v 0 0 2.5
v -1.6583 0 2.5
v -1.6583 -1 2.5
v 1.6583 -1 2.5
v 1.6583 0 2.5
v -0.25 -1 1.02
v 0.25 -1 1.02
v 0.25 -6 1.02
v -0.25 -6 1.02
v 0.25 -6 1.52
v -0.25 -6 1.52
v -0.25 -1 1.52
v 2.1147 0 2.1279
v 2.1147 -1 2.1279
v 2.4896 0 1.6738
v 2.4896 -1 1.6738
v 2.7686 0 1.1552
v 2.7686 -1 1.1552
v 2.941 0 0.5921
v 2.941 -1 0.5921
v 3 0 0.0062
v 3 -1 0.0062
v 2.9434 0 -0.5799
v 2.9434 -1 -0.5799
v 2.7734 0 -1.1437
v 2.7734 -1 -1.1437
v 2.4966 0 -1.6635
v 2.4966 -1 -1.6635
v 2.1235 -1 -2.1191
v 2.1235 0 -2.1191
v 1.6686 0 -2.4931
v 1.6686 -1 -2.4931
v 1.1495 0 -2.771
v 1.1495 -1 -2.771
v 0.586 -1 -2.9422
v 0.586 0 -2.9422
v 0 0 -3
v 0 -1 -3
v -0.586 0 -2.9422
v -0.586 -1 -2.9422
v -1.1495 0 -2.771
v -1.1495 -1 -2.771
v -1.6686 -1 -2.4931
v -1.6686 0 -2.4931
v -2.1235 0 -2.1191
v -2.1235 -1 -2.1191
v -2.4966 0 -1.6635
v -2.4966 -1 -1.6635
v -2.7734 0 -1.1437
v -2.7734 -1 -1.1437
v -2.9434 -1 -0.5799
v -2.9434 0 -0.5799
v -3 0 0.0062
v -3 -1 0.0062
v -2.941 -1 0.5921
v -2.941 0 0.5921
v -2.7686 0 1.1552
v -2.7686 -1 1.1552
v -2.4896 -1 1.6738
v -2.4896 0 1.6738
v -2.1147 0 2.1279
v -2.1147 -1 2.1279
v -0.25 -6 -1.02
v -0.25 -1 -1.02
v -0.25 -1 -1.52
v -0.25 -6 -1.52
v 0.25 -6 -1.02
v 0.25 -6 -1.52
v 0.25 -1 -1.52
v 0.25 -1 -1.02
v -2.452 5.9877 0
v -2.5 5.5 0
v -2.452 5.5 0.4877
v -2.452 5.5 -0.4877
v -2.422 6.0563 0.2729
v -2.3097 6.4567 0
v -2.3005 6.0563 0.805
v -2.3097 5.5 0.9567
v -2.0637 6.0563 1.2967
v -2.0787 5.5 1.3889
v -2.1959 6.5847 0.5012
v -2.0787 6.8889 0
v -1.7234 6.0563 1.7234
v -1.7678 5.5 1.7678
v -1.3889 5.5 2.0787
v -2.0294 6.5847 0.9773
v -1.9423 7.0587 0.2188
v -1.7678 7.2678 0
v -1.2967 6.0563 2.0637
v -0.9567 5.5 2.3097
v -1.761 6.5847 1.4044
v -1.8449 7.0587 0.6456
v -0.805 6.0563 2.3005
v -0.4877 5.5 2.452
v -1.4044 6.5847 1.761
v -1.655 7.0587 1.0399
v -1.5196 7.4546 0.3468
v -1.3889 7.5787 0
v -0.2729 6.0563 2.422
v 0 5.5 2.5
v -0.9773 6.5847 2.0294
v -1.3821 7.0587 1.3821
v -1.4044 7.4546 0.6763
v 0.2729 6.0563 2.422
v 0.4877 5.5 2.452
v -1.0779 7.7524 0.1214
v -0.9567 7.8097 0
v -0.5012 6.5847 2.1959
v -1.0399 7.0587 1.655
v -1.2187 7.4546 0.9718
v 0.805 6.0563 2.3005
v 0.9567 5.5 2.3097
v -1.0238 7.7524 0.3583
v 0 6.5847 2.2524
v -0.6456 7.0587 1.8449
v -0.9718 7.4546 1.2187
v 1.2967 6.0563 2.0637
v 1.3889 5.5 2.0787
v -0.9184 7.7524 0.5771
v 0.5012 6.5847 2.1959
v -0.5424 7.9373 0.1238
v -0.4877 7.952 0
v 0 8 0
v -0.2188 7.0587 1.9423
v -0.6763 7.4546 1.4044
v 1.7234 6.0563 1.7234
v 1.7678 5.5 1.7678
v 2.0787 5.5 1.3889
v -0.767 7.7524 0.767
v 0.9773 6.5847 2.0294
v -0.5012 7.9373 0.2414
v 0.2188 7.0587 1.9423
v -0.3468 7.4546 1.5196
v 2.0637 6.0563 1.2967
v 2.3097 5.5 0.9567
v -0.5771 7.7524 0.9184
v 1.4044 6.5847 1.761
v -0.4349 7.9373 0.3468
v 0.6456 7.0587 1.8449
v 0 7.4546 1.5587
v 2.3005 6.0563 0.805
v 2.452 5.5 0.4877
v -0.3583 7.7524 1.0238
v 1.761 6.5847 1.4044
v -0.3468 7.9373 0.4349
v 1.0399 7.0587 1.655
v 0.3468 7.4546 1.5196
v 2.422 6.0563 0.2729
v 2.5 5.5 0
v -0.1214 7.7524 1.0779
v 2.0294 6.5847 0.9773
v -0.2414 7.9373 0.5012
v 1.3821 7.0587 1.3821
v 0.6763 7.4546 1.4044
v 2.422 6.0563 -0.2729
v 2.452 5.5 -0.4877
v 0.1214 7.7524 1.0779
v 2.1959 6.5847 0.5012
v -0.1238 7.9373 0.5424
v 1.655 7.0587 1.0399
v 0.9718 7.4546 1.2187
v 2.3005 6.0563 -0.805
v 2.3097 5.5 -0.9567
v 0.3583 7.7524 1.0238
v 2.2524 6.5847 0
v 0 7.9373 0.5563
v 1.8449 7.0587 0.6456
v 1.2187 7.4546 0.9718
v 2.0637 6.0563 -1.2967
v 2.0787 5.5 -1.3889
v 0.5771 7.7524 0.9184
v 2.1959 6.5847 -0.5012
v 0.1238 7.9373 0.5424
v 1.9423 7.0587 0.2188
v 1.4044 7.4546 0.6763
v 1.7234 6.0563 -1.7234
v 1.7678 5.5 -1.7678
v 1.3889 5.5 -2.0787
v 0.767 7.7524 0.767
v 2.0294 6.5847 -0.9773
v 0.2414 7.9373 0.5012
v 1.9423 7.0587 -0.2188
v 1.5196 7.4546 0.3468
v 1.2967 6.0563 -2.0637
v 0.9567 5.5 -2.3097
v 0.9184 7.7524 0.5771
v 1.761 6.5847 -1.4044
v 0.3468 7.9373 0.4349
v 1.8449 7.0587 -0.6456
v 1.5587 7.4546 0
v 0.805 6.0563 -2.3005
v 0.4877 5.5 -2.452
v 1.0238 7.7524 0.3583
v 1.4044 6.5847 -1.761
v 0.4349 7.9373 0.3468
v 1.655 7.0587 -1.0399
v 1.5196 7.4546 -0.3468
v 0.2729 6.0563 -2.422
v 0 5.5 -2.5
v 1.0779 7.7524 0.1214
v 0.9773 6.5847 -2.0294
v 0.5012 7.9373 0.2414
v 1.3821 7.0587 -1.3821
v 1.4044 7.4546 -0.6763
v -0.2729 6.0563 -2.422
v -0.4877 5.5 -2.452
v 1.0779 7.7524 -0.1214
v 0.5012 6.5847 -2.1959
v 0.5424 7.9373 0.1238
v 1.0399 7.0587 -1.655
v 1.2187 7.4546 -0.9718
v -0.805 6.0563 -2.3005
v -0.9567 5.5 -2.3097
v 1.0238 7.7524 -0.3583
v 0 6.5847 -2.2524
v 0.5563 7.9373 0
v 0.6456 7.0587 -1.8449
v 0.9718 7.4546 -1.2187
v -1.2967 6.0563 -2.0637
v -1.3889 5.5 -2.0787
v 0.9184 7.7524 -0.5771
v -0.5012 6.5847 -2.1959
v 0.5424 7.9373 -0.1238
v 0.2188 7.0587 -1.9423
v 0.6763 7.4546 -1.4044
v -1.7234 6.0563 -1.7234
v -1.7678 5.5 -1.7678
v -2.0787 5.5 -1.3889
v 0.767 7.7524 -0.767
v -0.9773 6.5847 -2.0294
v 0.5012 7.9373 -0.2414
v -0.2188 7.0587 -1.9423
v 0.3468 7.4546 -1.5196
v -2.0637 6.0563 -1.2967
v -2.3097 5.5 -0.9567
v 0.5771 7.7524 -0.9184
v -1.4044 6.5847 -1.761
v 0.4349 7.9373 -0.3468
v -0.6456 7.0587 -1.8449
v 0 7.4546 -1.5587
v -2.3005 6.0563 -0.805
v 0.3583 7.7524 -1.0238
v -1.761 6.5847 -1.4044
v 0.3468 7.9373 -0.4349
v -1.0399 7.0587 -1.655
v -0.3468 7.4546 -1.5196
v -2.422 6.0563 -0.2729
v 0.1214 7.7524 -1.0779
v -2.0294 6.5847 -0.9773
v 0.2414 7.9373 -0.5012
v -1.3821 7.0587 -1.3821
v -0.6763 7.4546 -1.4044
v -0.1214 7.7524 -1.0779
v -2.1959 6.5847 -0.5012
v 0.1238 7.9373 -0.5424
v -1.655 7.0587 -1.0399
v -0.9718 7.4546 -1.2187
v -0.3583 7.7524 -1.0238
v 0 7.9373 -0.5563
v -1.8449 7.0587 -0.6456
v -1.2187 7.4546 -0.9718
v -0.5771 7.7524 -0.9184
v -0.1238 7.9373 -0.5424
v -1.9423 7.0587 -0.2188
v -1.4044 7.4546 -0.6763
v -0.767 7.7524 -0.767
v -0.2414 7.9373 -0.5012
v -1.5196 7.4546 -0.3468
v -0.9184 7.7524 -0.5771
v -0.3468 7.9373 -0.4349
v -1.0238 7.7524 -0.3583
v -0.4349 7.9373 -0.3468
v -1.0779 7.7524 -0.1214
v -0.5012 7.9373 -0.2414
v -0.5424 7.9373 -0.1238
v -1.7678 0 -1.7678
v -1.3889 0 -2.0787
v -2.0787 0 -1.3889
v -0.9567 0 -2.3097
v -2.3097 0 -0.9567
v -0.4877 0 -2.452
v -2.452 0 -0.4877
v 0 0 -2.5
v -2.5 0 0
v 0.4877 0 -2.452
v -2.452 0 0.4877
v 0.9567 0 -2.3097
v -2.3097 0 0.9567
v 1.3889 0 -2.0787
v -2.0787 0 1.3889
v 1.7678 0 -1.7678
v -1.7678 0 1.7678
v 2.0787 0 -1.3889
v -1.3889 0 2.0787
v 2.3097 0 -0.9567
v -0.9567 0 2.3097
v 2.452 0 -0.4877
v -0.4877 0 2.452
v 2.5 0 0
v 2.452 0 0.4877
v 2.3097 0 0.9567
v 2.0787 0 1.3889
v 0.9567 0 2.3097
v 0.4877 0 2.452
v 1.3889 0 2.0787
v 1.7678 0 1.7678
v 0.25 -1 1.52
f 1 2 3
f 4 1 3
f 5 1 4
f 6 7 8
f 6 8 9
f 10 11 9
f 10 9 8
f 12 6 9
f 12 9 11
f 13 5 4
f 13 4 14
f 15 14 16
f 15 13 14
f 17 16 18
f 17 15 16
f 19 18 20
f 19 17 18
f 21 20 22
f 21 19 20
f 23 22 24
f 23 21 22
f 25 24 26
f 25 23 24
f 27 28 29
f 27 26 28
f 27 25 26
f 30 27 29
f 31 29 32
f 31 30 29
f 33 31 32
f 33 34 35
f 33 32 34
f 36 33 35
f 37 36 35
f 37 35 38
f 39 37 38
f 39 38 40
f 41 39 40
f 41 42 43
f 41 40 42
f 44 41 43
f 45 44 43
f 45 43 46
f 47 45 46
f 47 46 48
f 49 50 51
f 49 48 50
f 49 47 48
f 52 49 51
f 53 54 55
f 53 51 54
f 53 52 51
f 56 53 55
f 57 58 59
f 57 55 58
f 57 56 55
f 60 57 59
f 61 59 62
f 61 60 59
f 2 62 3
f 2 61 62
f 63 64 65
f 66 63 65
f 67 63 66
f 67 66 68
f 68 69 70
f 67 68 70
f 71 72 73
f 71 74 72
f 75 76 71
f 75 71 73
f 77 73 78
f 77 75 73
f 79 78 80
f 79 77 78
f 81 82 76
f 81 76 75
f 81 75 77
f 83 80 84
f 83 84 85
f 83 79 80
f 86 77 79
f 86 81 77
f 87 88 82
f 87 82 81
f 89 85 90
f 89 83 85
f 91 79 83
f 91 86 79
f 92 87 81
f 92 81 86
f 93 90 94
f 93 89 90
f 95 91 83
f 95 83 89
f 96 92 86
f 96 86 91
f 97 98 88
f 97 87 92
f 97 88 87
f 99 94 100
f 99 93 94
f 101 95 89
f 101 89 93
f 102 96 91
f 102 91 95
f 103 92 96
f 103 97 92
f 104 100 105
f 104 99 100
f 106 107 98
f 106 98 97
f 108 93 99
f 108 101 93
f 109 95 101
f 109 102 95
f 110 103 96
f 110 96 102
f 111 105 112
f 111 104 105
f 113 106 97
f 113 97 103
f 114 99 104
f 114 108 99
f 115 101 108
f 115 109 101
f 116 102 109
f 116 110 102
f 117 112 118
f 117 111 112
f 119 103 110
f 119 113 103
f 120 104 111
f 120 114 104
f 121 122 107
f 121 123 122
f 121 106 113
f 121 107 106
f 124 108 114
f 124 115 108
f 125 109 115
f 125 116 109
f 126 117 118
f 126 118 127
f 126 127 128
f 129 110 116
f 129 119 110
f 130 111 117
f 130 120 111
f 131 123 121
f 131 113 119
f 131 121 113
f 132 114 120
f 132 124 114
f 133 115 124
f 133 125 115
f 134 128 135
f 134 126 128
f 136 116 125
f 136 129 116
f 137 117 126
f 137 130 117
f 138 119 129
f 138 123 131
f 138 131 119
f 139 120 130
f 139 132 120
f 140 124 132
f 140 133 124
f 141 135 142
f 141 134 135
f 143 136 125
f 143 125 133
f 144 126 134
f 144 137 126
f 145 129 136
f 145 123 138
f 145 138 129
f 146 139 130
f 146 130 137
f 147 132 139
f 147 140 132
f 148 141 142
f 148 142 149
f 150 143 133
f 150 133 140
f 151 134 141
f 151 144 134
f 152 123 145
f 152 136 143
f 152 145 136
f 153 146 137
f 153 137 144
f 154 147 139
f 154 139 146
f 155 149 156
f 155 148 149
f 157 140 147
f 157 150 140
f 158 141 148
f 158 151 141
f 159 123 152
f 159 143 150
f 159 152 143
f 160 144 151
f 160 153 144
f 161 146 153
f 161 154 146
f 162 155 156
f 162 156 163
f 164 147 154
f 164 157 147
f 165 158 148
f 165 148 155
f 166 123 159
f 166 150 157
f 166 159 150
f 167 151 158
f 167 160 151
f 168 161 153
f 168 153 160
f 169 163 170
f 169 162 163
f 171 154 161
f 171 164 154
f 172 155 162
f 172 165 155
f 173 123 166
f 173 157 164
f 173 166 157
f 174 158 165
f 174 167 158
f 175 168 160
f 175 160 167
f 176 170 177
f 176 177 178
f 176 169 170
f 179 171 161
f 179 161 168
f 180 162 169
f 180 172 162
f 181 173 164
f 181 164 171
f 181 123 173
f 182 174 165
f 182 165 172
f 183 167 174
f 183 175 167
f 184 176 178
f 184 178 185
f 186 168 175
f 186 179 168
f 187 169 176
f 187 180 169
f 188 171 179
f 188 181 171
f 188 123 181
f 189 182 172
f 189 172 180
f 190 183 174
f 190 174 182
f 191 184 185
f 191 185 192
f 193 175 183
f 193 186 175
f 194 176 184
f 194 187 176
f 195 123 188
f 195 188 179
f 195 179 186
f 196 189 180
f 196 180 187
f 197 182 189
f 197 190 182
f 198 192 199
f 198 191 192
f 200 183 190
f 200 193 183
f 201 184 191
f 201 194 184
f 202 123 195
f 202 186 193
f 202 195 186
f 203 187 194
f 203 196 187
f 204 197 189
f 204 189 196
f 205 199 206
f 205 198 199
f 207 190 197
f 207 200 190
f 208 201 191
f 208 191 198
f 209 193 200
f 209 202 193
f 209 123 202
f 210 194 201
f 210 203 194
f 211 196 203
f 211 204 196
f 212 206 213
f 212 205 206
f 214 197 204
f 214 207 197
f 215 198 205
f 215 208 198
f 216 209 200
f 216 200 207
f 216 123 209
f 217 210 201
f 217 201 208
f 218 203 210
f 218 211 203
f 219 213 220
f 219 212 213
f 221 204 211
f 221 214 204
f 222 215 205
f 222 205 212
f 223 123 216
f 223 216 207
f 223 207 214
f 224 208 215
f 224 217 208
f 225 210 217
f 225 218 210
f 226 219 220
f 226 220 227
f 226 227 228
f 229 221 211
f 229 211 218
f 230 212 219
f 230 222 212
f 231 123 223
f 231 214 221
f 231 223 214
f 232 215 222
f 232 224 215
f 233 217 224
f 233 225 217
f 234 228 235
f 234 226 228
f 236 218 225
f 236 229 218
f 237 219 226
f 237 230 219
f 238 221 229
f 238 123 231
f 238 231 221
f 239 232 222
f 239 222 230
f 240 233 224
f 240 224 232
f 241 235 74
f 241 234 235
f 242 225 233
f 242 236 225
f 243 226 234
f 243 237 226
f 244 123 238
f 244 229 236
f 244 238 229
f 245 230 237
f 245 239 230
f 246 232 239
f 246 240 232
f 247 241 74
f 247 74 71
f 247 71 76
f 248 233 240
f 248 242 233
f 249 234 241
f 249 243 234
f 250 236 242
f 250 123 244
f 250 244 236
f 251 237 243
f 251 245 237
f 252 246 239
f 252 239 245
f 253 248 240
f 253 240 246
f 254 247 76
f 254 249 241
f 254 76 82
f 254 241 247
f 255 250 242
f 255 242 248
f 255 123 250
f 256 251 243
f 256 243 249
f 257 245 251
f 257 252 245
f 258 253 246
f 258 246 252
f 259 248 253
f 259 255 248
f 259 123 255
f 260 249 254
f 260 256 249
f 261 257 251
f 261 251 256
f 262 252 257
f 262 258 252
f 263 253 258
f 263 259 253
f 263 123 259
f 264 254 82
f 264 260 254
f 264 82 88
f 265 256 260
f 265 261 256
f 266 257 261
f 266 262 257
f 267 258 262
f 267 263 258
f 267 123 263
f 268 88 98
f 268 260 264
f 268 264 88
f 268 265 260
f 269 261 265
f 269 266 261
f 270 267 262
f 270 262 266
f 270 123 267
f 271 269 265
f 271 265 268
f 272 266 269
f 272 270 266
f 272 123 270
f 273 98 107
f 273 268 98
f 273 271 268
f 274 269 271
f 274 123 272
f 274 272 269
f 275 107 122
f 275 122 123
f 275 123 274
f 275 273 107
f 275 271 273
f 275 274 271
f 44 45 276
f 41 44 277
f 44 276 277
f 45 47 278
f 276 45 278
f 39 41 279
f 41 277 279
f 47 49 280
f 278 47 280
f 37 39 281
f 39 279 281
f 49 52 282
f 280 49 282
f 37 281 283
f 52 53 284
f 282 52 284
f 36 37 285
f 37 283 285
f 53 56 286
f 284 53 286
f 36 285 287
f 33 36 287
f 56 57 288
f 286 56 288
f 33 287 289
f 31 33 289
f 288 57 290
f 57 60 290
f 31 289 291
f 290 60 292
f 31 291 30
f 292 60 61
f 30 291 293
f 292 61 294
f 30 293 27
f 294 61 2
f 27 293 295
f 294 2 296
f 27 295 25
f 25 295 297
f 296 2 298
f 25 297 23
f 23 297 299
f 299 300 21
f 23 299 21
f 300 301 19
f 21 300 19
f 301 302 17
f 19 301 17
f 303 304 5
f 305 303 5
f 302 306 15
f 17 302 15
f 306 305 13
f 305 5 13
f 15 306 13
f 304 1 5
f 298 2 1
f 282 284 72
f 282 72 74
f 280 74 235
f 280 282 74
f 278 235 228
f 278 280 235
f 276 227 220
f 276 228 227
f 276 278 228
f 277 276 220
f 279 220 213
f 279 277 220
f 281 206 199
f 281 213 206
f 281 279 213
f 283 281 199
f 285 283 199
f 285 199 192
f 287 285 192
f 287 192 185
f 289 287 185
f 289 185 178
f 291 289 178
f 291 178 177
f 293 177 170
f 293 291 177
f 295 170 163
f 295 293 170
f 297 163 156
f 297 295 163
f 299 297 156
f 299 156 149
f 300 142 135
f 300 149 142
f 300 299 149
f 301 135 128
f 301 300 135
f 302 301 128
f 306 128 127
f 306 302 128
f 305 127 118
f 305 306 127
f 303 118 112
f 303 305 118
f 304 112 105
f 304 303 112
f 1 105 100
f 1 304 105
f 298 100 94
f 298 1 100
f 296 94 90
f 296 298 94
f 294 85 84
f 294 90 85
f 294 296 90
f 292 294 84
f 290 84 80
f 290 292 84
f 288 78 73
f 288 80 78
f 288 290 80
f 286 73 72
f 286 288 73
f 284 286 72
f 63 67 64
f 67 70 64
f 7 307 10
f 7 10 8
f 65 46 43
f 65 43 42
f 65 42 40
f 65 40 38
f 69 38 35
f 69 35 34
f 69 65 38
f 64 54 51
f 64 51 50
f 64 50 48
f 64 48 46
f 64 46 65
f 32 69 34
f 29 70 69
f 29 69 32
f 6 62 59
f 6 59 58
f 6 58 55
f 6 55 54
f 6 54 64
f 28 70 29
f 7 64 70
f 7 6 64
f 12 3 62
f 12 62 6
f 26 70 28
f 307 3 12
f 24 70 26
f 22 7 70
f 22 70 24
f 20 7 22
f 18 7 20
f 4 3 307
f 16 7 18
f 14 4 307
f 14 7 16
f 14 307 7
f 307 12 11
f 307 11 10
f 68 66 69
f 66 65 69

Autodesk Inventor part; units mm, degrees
ref_plane "YZ Plane" through (0, 0, 0) normal (1, 0, 0) x (0, 1, 0)
ref_plane "XZ Plane" through (0, 0, 0) normal (0, 1, 0) x (-1, 0, 0)
ref_plane "XY Plane" through (0, 0, 0) normal (0, 0, 1) x (1, 0, 0)
sketch "Skizze1" plane through (0, 0, 0) normal (0, 1, 0) x (-1, 0, 0)
  circle A0 centre (0, 0) radius 2.5
  dimension "d0" = 5
extrude "Höhe" add sketch "Skizze1" along normal blind 8
fillet "Radius_Kopf" radius 2.5 1 edges at (2.5, 8, 0)
sketch "Skizze2" plane through (0, 0, 0) normal (0, -1, 0) x (1, 0, 0)
  arc A0 (-1.6583, 2.5) -> (1.6583, 2.5) centre (0, 0) ccw
  line L0 (-1.6583, 2.5) -> (1.6583, 2.5)
  circle A1 centre (0, 0) radius 2.5 projected
  dimension "d4" = 6
extrude "Kante" add sketch "Skizze2" along normal blind 1 contours A1 | L0 A0
sketch "Skizze3" plane through (0, -1, 0) normal (0, -1, 0) x (1, 0, 0)
  circle A0 centre (0, 0) radius 2.5 construction
  line L0 (0, 2.5) -> (0, -3) construction
  arc A1 (-1.6583, 2.5) -> (1.6583, 2.5) centre (0, 0) ccw construction
  line L1 (-2.5, 0) -> (2.5, 0) construction
  line L2 (-0.25, 1.52) -> (0.25, 1.52)
  line L3 (0.25, 1.52) -> (0.25, 1.02)
  line L4 (0.25, 1.02) -> (-0.25, 1.02)
  line L5 (-0.25, 1.02) -> (-0.25, 1.52)
  line L6 (-0.25, 1.27) -> (0.25, 1.27) construction
  line L7 (-0.25, -1.52) -> (0.25, -1.52)
  line L8 (0.25, -1.52) -> (0.25, -1.02)
  line L9 (0.25, -1.02) -> (-0.25, -1.02)
  line L10 (-0.25, -1.02) -> (-0.25, -1.52)
  point P0 (0, 1.27)
  point P1 (0, -1.27)
  dimension "d7" = 2.54
  dimension "d8" = 0.5
  dimension "d9" = 0.5
extrude "Pin" add sketch "Skizze3" along normal blind 5
properties part number "LED_5mm_Gelb"
